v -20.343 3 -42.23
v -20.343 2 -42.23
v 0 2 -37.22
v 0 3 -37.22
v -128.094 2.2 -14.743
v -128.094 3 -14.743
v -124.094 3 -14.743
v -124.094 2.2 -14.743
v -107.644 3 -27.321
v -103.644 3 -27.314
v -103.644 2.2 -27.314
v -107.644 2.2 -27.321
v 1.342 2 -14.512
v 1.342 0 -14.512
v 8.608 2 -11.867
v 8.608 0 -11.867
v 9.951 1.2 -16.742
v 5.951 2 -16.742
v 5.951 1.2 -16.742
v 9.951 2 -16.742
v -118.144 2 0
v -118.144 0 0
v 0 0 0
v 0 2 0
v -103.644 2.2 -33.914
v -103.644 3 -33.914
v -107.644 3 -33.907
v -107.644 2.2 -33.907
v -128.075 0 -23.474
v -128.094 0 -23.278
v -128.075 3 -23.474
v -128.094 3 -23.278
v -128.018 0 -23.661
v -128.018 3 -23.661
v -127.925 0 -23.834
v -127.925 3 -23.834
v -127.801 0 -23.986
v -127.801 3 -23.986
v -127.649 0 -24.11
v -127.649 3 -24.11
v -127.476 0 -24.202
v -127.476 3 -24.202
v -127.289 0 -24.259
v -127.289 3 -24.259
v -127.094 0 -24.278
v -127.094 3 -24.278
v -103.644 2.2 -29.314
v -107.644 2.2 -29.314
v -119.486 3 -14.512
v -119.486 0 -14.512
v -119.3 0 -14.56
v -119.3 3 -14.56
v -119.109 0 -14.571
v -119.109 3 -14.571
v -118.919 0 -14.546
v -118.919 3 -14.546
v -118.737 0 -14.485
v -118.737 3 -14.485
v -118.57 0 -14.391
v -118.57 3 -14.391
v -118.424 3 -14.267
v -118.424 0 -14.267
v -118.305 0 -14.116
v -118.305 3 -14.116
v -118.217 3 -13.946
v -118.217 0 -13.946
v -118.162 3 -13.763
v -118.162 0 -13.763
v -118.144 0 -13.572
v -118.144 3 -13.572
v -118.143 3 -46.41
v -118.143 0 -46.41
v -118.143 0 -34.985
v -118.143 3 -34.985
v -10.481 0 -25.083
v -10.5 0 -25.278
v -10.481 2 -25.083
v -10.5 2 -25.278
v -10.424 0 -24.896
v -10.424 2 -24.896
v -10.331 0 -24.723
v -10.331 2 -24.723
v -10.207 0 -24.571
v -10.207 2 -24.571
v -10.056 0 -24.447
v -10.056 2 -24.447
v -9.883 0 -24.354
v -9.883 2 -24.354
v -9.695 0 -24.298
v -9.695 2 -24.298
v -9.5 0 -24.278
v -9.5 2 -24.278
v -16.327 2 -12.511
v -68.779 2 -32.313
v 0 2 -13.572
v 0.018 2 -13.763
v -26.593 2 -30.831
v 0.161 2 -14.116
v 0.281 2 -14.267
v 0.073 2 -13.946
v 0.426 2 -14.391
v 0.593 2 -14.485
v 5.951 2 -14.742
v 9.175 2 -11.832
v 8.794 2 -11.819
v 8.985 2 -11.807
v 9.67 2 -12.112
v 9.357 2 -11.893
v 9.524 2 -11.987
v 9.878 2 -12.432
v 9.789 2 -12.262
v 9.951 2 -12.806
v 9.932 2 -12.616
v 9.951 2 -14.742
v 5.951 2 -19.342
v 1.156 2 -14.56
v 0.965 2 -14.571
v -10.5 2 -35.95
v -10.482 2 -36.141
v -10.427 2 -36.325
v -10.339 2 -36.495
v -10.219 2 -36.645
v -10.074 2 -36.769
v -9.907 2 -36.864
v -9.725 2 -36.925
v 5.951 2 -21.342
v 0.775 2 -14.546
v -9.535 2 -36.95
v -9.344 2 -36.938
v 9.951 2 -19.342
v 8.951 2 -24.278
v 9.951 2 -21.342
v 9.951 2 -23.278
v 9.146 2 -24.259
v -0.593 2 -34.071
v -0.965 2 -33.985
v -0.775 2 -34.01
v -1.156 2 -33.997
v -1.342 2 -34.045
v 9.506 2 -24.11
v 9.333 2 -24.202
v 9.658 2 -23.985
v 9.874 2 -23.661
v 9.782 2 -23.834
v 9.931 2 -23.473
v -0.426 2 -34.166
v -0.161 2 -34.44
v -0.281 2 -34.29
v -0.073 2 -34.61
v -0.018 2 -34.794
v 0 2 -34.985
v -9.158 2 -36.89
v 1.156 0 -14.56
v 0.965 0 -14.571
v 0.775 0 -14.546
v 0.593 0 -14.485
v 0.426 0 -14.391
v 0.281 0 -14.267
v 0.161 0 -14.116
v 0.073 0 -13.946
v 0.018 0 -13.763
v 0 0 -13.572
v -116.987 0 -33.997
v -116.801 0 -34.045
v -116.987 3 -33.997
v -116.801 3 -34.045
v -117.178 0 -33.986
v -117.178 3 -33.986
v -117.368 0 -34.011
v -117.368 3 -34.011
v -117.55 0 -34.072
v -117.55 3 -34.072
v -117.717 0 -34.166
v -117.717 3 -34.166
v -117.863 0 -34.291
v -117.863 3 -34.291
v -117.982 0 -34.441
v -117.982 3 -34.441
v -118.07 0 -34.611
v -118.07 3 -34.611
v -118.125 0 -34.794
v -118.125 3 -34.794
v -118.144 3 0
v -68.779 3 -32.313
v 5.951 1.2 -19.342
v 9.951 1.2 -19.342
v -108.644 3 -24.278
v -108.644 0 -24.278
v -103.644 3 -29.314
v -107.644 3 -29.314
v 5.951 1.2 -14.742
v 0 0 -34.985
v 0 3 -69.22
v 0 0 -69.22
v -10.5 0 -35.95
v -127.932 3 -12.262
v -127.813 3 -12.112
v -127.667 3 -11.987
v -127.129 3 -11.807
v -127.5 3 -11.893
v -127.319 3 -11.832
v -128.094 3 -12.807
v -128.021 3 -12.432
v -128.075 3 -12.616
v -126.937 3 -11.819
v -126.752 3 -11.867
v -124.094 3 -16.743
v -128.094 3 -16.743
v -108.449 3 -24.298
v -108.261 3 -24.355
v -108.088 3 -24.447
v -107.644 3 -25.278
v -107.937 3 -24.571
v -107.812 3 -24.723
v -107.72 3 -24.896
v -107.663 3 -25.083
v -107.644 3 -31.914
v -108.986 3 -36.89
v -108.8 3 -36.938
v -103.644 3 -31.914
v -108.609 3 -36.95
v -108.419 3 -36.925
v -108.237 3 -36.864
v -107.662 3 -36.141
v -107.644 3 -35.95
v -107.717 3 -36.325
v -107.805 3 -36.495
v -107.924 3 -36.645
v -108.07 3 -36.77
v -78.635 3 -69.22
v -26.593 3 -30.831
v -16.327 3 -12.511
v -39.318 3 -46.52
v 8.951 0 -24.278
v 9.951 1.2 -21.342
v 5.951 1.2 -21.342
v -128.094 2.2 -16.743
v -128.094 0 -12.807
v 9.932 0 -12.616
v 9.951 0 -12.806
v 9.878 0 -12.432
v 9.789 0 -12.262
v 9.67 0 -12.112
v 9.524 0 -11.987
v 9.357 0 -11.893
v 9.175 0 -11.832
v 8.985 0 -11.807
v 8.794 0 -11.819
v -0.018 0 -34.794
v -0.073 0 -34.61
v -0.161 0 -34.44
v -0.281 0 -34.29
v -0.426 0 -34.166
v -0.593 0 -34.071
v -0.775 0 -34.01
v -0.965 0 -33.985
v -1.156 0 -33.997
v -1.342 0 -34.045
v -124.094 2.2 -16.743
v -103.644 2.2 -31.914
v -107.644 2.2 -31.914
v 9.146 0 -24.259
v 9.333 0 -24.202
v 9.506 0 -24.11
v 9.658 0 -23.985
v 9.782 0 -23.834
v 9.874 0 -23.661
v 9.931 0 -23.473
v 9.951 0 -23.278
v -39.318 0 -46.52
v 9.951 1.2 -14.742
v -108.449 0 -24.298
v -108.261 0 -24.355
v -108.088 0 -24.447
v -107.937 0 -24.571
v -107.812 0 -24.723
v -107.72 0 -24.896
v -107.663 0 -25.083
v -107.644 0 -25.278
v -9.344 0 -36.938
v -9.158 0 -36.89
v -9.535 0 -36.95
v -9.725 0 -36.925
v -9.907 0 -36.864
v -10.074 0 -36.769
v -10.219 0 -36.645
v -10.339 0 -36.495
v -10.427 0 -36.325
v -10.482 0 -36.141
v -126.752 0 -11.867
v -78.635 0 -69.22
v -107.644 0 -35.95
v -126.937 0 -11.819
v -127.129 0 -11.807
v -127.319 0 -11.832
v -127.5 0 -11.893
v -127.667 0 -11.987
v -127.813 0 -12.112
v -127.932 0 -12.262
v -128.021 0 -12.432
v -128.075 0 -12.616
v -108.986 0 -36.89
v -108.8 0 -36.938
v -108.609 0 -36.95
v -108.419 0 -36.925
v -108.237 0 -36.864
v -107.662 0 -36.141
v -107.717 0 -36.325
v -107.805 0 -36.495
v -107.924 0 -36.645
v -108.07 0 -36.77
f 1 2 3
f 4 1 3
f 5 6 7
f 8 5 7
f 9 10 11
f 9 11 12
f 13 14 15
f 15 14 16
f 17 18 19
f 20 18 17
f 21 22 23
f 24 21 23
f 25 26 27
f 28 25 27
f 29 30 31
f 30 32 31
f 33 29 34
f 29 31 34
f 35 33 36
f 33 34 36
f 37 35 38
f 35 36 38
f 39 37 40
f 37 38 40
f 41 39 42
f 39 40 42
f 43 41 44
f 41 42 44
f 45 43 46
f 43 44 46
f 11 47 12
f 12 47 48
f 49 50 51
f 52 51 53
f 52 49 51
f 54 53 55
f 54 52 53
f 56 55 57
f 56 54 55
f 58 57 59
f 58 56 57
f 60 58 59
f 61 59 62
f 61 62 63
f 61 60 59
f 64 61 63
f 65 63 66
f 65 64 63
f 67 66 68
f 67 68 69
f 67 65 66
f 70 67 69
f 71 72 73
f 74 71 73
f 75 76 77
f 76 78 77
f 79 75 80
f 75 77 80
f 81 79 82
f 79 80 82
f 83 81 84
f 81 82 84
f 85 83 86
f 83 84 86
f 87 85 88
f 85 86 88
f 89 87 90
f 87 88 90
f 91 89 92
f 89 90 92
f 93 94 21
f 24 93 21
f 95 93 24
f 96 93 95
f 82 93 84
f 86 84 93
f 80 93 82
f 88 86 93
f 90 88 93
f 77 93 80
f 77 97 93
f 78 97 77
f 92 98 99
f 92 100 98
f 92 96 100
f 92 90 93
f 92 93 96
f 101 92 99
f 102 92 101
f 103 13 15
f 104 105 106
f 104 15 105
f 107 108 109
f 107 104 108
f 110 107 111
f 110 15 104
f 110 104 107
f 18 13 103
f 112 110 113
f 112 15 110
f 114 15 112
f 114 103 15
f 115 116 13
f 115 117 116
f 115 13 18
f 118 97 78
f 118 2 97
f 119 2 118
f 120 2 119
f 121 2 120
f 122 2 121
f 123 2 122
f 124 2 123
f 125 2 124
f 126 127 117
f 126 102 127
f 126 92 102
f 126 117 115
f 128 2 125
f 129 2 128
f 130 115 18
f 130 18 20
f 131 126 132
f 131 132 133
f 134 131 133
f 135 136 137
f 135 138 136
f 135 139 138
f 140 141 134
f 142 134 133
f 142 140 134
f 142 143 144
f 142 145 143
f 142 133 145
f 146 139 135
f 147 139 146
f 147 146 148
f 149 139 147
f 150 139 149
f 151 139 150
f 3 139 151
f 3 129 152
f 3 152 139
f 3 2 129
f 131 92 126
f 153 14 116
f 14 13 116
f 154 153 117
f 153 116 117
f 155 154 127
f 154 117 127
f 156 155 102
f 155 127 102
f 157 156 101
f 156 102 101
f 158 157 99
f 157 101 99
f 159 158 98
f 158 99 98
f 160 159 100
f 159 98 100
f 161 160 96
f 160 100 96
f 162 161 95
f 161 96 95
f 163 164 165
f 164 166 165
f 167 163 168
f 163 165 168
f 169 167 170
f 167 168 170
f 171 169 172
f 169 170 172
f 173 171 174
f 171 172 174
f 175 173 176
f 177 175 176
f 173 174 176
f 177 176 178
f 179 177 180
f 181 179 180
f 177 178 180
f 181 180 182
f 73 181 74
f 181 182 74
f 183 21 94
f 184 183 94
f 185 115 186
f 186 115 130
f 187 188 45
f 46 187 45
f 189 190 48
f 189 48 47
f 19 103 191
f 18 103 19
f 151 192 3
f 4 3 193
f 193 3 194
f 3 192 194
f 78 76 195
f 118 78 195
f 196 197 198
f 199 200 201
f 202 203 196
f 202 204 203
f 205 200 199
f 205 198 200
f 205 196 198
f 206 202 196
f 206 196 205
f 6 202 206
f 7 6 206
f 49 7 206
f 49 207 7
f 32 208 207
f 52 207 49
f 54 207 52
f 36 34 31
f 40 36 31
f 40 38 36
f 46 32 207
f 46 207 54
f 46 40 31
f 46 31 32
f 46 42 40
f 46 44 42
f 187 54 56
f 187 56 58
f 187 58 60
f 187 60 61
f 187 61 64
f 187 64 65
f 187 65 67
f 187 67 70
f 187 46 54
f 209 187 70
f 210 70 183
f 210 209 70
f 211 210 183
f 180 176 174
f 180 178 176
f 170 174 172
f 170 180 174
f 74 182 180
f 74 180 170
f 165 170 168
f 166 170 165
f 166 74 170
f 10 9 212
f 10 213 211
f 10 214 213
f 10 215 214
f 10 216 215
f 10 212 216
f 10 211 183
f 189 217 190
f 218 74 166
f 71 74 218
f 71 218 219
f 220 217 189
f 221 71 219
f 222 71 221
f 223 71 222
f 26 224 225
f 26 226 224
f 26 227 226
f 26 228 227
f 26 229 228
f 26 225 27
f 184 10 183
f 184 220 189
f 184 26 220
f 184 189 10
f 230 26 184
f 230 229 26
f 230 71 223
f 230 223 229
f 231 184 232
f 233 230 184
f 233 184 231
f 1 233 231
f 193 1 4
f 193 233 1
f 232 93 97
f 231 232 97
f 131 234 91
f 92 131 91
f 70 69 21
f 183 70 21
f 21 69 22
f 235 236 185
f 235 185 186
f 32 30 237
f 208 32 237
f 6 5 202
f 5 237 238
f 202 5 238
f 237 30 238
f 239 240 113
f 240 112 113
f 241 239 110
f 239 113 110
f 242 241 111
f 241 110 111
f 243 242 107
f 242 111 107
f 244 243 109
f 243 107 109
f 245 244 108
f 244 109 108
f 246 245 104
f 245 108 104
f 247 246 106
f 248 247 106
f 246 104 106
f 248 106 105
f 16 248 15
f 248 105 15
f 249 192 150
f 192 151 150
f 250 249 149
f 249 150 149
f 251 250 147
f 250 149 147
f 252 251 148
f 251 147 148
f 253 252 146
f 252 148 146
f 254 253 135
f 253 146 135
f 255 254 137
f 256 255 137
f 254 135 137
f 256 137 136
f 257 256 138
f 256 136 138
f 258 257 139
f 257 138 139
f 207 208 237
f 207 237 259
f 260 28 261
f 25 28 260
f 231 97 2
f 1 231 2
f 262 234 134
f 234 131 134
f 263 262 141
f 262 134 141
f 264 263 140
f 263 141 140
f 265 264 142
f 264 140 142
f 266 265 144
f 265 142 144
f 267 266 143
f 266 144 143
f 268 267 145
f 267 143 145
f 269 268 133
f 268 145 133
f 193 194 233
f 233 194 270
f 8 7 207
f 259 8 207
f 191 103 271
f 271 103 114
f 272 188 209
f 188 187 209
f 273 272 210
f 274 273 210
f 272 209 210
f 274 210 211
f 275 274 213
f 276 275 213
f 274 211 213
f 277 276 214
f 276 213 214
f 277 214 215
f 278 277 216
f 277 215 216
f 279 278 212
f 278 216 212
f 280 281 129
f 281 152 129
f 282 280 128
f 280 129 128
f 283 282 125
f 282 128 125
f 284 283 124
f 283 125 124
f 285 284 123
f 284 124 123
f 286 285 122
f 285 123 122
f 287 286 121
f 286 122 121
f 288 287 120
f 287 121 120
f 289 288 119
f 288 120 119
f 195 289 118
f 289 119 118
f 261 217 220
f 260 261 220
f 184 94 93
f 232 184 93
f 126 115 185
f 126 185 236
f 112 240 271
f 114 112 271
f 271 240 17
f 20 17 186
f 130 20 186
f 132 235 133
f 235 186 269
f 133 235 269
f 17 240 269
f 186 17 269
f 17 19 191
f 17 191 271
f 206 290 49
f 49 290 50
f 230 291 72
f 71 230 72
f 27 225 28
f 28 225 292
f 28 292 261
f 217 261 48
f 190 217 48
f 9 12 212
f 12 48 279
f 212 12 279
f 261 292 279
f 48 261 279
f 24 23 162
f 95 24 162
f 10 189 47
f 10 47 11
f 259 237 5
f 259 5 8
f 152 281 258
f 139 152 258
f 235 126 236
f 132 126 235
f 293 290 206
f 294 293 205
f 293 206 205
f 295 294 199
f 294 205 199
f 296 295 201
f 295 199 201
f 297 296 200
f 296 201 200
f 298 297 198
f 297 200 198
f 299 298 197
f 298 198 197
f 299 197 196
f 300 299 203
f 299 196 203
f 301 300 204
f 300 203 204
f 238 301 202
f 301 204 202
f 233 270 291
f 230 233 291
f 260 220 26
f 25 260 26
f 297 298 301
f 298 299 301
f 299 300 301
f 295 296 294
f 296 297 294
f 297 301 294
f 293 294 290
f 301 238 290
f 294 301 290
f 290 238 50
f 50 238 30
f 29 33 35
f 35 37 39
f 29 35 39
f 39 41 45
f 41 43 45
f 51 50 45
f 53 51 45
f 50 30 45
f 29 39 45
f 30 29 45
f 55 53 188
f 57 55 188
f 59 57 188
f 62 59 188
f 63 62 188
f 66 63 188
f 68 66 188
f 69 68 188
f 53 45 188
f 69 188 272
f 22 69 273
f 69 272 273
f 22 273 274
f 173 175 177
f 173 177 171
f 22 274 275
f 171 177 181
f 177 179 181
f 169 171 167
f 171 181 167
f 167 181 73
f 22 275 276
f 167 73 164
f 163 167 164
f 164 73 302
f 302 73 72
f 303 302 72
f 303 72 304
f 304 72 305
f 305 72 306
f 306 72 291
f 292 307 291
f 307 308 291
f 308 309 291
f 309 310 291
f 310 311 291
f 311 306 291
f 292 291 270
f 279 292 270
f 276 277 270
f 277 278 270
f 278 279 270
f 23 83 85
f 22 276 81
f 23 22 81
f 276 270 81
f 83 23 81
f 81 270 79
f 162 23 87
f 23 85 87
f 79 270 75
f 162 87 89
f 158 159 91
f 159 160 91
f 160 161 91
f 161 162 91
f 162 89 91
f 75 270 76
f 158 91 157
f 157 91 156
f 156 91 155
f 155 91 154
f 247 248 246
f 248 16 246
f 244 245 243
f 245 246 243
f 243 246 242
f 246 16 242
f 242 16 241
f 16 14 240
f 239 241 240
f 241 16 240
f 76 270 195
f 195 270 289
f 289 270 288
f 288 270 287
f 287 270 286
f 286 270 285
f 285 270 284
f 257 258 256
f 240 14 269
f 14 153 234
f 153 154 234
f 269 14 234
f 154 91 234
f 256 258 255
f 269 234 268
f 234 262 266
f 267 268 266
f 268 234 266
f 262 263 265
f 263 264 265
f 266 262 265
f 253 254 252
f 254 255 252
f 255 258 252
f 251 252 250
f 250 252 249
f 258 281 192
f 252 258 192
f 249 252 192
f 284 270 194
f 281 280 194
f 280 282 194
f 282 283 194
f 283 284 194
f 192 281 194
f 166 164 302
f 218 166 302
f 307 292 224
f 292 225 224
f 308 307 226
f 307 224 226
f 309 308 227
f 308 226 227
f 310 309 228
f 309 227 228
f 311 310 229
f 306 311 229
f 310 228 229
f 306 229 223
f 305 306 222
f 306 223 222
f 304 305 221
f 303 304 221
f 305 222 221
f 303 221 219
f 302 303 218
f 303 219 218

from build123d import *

# Parameters (mm, degrees)
P_IDAT_VYSUNUT_M1_DEPTH  = 3
P_IDAT_VYSUNUT_M2_DEPTH  = 2
ZAOBLIT4_R               = 1
SKICA2_W                 = 4
SKICA2_H                 = 2
ODEBRAT_VYSUNUT_M2_DEPTH = 0.8
SKICA3_W                 = 4
SKICA3_H                 = 2
ODEBRAT_VYSUNUT_M3_DEPTH = 0.8


with BuildPart() as part:
    # Skica1 → P_idat vysunut_m1 (new body)
    with BuildSketch(Plane(origin=(0, 0, 0), x_dir=(1, 0, 0), z_dir=(0, 1, 0))):
        Polygon((-118.143750166, 15), (-118.143750166, 0), (-68.779346971, 32.313398106), (-16.32734533, 12.51119421), (-26.593132493, 30.830954414), (-20.343228113, 42.230019956), (0, 37.22), (0, 69.22), (-39.317553332, 46.52), (-78.635106664, 69.22), (-118.143185584, 46.41), (-118.143185584, 33.5570142), (-107.643750166, 37.378496169), (-107.643750166, 24.278496169), (-128.093750166, 24.278496169), (-128.093750166, 11.378496169), align=None)
    extrude(amount=P_IDAT_VYSUNUT_M1_DEPTH)

    # Skica1_5 → P_idat vysunut_m2 (add)
    with BuildSketch(Plane(origin=(0, 0, 0), x_dir=(1, 0, 0), z_dir=(0, 1, 0))):
        Polygon((-68.779346971, 32.313398106), (-118.143750166, 0), (0, 0), (0, 15), (9.950504516, 11.37831254), (9.950504516, 24.27831254), (-10.5, 24.27831254), (-10.5, 37.37831254), (0, 33.55662508), (0, 37.22), (-20.343228113, 42.230019956), (-26.593132493, 30.830954414), (-16.32734533, 12.51119421), align=None)
    extrude(amount=P_IDAT_VYSUNUT_M2_DEPTH)

    # Zaoblit4
    zaoblit4_edges = [part.edges().sort_by_distance(p)[0] for p in [
        (-118.143750166, 1.5, -15),
        (-128.093750166, 1.5, -11.378496169),
        (-128.093750166, 1.5, -24.278496169),
        (-107.643750166, 1.5, -24.278496169),
        (-107.643750166, 1.5, -37.378496169),
        (-118.143185584, 1.5, -33.5570142),
        (-10.5, 1, -24.27831254),
        (-10.5, 1, -37.37831254),
        (0, 1, -33.55662508),
        (0, 1, -15),
        (9.950504516, 1, -11.37831254),
        (9.950504516, 1, -24.27831254),
    ]]
    fillet(zaoblit4_edges, radius=ZAOBLIT4_R)

    # Skica2 → Odebrat vysunut_m2 (cut)
    with BuildSketch(Plane(origin=(0, 3, 0), x_dir=(1, 0, 0), z_dir=(0, 1, 0))):
        with Locations((-126.093750166, 15.742570172)):
            Rectangle(SKICA2_W, SKICA2_H)
        Polygon((-103.64375629, 27.314422166), (-107.643750166, 27.321421806), (-107.643750166, 29.314422166), (-103.643750166, 29.314422166), align=None)
        Polygon((-103.64375629, 33.914422166), (-107.643750166, 33.907422526), (-107.643750166, 31.914422166), (-103.643750166, 31.914422166), align=None)
    extrude(amount=-ODEBRAT_VYSUNUT_M2_DEPTH, mode=Mode.SUBTRACT)

    # Skica3 → Odebrat vysunut_m3 (cut)
    with BuildSketch(Plane(origin=(0, 2, 0), x_dir=(1, 0, 0), z_dir=(0, 1, 0))):
        with Locations((7.950504516, 15.742386544)):
            Rectangle(SKICA3_W, SKICA3_H)
        with Locations((7.950504516, 20.342386544)):
            Rectangle(SKICA3_W, SKICA3_H)
    extrude(amount=-ODEBRAT_VYSUNUT_M3_DEPTH, mode=Mode.SUBTRACT)


solid = part.part
